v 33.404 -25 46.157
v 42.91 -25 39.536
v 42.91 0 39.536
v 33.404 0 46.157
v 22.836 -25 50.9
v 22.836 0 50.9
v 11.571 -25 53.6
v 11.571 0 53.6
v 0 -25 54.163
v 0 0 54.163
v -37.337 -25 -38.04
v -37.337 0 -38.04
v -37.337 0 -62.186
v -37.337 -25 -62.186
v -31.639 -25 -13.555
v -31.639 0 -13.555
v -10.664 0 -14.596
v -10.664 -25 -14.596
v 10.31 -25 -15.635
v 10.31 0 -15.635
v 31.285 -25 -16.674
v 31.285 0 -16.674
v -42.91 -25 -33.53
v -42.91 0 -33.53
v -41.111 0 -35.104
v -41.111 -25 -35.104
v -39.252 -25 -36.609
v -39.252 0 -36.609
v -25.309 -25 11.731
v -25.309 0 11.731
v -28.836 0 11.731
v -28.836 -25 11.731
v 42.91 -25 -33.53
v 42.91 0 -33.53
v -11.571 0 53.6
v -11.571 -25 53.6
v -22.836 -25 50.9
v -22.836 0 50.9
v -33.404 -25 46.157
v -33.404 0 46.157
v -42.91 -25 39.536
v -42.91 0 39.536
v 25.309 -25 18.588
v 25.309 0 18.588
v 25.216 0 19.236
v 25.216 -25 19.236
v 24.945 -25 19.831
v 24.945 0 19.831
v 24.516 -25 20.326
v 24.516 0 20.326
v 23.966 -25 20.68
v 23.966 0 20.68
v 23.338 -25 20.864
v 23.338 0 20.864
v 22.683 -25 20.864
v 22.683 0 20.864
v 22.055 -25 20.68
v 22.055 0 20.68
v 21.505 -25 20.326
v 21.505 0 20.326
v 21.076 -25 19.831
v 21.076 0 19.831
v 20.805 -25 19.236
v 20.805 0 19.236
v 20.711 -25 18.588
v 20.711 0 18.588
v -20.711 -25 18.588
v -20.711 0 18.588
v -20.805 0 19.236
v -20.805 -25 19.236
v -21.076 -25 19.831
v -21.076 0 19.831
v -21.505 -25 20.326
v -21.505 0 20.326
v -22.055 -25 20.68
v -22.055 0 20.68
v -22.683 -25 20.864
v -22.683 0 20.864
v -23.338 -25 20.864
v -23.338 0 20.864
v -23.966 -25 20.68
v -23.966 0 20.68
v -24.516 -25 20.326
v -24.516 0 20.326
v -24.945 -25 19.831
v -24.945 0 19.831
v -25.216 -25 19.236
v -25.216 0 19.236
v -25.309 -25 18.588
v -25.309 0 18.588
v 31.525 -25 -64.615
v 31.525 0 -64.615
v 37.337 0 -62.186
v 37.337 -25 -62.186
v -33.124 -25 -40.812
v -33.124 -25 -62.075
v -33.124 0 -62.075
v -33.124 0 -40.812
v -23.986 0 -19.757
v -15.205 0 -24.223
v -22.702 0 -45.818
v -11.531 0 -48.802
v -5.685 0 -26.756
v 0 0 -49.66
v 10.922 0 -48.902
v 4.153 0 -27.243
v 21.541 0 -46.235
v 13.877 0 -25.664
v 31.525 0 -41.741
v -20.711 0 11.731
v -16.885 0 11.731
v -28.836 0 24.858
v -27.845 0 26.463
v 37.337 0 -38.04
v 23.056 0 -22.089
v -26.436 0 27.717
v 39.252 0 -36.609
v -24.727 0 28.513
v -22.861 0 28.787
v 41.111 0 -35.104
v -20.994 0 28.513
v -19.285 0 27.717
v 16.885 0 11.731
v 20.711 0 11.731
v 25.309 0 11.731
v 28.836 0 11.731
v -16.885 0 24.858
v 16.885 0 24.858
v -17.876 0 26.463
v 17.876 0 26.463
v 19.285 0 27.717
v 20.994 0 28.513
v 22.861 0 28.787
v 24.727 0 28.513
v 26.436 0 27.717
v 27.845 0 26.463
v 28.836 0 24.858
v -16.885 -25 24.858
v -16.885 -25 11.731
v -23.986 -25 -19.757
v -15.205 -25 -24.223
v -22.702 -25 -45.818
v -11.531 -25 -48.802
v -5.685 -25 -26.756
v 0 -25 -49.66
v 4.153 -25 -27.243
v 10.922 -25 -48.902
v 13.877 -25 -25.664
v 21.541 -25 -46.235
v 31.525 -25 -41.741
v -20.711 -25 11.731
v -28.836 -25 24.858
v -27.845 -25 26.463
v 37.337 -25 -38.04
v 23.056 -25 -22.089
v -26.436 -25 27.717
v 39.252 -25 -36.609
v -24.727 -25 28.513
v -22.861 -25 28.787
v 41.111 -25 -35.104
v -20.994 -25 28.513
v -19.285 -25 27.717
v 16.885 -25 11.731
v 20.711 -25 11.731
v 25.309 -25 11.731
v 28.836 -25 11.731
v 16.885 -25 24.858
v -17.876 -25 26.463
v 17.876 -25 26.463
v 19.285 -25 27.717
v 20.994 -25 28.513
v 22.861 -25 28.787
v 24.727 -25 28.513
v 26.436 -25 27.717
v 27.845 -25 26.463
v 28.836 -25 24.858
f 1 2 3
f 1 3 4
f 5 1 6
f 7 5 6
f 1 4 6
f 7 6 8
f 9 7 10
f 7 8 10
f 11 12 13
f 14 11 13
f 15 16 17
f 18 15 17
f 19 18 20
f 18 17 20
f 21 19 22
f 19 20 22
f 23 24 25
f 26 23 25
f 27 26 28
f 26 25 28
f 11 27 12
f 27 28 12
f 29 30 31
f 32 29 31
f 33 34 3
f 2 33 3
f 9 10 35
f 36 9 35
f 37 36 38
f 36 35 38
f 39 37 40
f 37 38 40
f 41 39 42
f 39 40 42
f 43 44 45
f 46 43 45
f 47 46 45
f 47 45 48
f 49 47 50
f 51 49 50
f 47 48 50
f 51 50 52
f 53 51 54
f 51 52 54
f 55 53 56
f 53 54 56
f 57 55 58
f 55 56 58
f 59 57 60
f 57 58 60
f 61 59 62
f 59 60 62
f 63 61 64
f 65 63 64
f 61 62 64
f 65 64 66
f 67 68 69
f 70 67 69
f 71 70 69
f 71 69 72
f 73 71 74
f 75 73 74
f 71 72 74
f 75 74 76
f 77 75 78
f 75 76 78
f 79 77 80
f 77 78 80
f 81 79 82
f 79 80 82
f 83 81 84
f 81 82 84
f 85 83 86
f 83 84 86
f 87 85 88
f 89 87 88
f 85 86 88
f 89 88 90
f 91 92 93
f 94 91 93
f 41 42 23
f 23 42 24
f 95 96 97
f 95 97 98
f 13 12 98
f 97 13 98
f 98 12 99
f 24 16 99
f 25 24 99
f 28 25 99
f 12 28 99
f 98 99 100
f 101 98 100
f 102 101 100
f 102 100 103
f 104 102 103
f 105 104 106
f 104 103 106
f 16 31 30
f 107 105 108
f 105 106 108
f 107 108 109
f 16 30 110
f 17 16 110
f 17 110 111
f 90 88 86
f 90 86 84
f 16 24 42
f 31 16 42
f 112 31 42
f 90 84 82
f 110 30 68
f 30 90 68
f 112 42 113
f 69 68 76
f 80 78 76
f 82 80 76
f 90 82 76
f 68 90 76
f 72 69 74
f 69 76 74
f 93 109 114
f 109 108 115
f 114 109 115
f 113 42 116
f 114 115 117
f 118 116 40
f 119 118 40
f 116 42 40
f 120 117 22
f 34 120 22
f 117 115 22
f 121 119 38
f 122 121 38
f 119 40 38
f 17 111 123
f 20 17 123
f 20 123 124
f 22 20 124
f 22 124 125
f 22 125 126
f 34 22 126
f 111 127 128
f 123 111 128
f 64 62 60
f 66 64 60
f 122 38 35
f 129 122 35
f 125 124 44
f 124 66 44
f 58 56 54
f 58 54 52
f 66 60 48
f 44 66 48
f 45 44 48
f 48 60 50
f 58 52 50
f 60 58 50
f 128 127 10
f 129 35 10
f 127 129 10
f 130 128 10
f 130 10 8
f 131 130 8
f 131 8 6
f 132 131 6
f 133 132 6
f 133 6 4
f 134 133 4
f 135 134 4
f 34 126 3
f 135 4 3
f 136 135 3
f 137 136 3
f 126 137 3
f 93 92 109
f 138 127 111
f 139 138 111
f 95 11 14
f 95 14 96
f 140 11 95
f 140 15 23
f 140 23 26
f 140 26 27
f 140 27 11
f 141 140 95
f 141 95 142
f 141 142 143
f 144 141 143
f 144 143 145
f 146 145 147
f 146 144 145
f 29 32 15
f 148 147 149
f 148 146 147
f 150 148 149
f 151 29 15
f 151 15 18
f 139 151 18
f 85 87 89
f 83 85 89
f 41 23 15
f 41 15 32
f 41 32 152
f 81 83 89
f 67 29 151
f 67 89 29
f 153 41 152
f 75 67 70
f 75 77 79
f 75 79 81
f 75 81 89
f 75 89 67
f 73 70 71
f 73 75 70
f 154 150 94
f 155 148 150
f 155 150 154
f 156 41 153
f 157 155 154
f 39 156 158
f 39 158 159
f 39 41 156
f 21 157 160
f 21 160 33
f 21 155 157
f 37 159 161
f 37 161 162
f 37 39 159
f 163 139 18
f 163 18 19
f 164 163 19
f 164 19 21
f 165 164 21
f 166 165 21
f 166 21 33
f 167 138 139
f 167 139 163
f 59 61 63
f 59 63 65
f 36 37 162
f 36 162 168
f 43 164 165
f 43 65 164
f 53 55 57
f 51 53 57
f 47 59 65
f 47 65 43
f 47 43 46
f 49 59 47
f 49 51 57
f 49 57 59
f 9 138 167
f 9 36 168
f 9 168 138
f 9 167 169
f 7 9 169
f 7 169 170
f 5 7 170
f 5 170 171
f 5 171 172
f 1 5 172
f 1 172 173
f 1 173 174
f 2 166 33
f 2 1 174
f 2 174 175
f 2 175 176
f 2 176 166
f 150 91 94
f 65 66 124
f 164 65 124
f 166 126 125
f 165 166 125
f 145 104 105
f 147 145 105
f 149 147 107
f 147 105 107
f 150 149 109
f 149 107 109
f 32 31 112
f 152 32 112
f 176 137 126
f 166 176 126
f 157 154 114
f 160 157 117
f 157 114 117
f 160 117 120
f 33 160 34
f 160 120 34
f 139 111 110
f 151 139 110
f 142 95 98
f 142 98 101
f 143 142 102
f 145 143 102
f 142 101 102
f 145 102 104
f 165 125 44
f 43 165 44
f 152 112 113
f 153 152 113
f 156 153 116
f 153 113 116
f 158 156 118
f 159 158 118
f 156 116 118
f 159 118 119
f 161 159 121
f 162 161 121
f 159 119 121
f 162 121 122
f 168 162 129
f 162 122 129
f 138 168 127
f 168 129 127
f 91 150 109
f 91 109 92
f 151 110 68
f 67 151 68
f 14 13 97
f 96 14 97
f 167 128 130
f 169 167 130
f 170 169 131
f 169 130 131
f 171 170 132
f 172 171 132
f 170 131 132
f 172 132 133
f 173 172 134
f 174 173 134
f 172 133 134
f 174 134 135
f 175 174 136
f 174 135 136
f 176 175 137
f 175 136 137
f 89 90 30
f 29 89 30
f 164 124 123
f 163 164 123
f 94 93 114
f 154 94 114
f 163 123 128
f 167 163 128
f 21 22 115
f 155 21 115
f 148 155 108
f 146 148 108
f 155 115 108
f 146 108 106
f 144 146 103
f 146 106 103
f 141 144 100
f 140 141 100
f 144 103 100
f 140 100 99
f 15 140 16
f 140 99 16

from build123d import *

# Parameters (mm, degrees)
F1_DEPTH = 25


with BuildPart() as f1:
    # F0 (on Front) → F1 (new body)
    with BuildSketch(Plane.XZ):
        with BuildLine():
            ThreePointArc((31.524628, -41.74067), (34.482234, -39.971165), (37.336944, -38.040047))
            ThreePointArc((37.336944, -38.040047), (40.188741, -35.865425), (42.910032, -33.52955))
            Line((42.910032, -33.52955), (42.910032, 39.535794))
            ThreePointArc((42.910032, 39.535794), (22.83568, 50.899702), (0, 54.163095))
            ThreePointArc((0, 54.163095), (-22.83568, 50.899702), (-42.910032, 39.535794))
            Line((-42.910032, 39.535794), (-42.910032, -33.52955))
            ThreePointArc((-42.910032, -33.52955), (-40.188741, -35.865425), (-37.336944, -38.040047))
            ThreePointArc((-37.336944, -38.040047), (-35.258682, -39.468633), (-33.124044, -40.81152))
            ThreePointArc((-33.124044, -40.81152), (-17.185862, -47.571204), (0, -49.660496))
            ThreePointArc((0, -49.660496), (16.290558, -47.803241), (31.524628, -41.74067))
        make_face()
        with BuildLine():
            ThreePointArc((31.285256, -16.673503), (-0.778877, -27.258788), (-31.63917, -13.554801))
            ThreePointArc((-31.63917, -13.554801), (-0.177021, -15.115437), (31.285256, -16.673503))
        make_face(mode=Mode.SUBTRACT)
        with BuildLine():
            Line((-25.309497, 11.731247), (-28.83604, 11.731247))
            Line((-28.83604, 11.731247), (-28.83604, 24.857815))
            ThreePointArc((-28.83604, 24.857815), (-22.860512, 28.786769), (-16.884984, 24.857815))
            Line((-16.884984, 24.857815), (-16.884984, 11.731247))
            Line((-16.884984, 11.731247), (-20.711496, 11.731247))
            Line((-20.711496, 11.731247), (-25.309497, 11.731247))
        make_face(mode=Mode.SUBTRACT)
        with BuildLine():
            Line((20.711496, 11.731247), (16.884984, 11.731247))
            Line((16.884984, 11.731247), (16.884984, 24.857815))
            ThreePointArc((16.884984, 24.857815), (22.860512, 28.786769), (28.83604, 24.857815))
            Line((28.83604, 24.857815), (28.83604, 11.731247))
            Line((28.83604, 11.731247), (25.309497, 11.731247))
            Line((25.309497, 11.731247), (20.711496, 11.731247))
        make_face(mode=Mode.SUBTRACT)
        with BuildLine():
            Line((-25.309497, 18.588411), (-25.309497, 11.731247))
            Line((-25.309497, 11.731247), (-20.711496, 11.731247))
            Line((-20.711496, 11.731247), (-20.711496, 18.588411))
            ThreePointArc((-20.711496, 18.588411), (-23.010497, 20.887411), (-25.309497, 18.588411))
        make_face()
        with BuildLine():
            Line((20.711496, 18.588411), (20.711496, 11.731247))
            Line((20.711496, 11.731247), (25.309497, 11.731247))
            Line((25.309497, 11.731247), (25.309497, 18.588411))
            ThreePointArc((25.309497, 18.588411), (23.010497, 20.887411), (20.711496, 18.588411))
        make_face()
        with BuildLine():
            Line((-33.124044, -62.074588), (-33.124044, -40.81152))
            ThreePointArc((-33.124044, -40.81152), (-35.258682, -39.468633), (-37.336944, -38.040047))
            Line((-37.336944, -38.040047), (-37.336944, -62.185542))
            Line((-37.336944, -62.185542), (-33.124044, -62.074588))
        make_face()
        with BuildLine():
            Line((31.524628, -64.615463), (37.336944, -62.185542))
            Line((37.336944, -62.185542), (37.336944, -38.040047))
            ThreePointArc((37.336944, -38.040047), (34.482234, -39.971165), (31.524628, -41.74067))
            Line((31.524628, -41.74067), (31.524628, -64.615463))
        make_face()
    extrude(amount=F1_DEPTH)


solid = f1.part
